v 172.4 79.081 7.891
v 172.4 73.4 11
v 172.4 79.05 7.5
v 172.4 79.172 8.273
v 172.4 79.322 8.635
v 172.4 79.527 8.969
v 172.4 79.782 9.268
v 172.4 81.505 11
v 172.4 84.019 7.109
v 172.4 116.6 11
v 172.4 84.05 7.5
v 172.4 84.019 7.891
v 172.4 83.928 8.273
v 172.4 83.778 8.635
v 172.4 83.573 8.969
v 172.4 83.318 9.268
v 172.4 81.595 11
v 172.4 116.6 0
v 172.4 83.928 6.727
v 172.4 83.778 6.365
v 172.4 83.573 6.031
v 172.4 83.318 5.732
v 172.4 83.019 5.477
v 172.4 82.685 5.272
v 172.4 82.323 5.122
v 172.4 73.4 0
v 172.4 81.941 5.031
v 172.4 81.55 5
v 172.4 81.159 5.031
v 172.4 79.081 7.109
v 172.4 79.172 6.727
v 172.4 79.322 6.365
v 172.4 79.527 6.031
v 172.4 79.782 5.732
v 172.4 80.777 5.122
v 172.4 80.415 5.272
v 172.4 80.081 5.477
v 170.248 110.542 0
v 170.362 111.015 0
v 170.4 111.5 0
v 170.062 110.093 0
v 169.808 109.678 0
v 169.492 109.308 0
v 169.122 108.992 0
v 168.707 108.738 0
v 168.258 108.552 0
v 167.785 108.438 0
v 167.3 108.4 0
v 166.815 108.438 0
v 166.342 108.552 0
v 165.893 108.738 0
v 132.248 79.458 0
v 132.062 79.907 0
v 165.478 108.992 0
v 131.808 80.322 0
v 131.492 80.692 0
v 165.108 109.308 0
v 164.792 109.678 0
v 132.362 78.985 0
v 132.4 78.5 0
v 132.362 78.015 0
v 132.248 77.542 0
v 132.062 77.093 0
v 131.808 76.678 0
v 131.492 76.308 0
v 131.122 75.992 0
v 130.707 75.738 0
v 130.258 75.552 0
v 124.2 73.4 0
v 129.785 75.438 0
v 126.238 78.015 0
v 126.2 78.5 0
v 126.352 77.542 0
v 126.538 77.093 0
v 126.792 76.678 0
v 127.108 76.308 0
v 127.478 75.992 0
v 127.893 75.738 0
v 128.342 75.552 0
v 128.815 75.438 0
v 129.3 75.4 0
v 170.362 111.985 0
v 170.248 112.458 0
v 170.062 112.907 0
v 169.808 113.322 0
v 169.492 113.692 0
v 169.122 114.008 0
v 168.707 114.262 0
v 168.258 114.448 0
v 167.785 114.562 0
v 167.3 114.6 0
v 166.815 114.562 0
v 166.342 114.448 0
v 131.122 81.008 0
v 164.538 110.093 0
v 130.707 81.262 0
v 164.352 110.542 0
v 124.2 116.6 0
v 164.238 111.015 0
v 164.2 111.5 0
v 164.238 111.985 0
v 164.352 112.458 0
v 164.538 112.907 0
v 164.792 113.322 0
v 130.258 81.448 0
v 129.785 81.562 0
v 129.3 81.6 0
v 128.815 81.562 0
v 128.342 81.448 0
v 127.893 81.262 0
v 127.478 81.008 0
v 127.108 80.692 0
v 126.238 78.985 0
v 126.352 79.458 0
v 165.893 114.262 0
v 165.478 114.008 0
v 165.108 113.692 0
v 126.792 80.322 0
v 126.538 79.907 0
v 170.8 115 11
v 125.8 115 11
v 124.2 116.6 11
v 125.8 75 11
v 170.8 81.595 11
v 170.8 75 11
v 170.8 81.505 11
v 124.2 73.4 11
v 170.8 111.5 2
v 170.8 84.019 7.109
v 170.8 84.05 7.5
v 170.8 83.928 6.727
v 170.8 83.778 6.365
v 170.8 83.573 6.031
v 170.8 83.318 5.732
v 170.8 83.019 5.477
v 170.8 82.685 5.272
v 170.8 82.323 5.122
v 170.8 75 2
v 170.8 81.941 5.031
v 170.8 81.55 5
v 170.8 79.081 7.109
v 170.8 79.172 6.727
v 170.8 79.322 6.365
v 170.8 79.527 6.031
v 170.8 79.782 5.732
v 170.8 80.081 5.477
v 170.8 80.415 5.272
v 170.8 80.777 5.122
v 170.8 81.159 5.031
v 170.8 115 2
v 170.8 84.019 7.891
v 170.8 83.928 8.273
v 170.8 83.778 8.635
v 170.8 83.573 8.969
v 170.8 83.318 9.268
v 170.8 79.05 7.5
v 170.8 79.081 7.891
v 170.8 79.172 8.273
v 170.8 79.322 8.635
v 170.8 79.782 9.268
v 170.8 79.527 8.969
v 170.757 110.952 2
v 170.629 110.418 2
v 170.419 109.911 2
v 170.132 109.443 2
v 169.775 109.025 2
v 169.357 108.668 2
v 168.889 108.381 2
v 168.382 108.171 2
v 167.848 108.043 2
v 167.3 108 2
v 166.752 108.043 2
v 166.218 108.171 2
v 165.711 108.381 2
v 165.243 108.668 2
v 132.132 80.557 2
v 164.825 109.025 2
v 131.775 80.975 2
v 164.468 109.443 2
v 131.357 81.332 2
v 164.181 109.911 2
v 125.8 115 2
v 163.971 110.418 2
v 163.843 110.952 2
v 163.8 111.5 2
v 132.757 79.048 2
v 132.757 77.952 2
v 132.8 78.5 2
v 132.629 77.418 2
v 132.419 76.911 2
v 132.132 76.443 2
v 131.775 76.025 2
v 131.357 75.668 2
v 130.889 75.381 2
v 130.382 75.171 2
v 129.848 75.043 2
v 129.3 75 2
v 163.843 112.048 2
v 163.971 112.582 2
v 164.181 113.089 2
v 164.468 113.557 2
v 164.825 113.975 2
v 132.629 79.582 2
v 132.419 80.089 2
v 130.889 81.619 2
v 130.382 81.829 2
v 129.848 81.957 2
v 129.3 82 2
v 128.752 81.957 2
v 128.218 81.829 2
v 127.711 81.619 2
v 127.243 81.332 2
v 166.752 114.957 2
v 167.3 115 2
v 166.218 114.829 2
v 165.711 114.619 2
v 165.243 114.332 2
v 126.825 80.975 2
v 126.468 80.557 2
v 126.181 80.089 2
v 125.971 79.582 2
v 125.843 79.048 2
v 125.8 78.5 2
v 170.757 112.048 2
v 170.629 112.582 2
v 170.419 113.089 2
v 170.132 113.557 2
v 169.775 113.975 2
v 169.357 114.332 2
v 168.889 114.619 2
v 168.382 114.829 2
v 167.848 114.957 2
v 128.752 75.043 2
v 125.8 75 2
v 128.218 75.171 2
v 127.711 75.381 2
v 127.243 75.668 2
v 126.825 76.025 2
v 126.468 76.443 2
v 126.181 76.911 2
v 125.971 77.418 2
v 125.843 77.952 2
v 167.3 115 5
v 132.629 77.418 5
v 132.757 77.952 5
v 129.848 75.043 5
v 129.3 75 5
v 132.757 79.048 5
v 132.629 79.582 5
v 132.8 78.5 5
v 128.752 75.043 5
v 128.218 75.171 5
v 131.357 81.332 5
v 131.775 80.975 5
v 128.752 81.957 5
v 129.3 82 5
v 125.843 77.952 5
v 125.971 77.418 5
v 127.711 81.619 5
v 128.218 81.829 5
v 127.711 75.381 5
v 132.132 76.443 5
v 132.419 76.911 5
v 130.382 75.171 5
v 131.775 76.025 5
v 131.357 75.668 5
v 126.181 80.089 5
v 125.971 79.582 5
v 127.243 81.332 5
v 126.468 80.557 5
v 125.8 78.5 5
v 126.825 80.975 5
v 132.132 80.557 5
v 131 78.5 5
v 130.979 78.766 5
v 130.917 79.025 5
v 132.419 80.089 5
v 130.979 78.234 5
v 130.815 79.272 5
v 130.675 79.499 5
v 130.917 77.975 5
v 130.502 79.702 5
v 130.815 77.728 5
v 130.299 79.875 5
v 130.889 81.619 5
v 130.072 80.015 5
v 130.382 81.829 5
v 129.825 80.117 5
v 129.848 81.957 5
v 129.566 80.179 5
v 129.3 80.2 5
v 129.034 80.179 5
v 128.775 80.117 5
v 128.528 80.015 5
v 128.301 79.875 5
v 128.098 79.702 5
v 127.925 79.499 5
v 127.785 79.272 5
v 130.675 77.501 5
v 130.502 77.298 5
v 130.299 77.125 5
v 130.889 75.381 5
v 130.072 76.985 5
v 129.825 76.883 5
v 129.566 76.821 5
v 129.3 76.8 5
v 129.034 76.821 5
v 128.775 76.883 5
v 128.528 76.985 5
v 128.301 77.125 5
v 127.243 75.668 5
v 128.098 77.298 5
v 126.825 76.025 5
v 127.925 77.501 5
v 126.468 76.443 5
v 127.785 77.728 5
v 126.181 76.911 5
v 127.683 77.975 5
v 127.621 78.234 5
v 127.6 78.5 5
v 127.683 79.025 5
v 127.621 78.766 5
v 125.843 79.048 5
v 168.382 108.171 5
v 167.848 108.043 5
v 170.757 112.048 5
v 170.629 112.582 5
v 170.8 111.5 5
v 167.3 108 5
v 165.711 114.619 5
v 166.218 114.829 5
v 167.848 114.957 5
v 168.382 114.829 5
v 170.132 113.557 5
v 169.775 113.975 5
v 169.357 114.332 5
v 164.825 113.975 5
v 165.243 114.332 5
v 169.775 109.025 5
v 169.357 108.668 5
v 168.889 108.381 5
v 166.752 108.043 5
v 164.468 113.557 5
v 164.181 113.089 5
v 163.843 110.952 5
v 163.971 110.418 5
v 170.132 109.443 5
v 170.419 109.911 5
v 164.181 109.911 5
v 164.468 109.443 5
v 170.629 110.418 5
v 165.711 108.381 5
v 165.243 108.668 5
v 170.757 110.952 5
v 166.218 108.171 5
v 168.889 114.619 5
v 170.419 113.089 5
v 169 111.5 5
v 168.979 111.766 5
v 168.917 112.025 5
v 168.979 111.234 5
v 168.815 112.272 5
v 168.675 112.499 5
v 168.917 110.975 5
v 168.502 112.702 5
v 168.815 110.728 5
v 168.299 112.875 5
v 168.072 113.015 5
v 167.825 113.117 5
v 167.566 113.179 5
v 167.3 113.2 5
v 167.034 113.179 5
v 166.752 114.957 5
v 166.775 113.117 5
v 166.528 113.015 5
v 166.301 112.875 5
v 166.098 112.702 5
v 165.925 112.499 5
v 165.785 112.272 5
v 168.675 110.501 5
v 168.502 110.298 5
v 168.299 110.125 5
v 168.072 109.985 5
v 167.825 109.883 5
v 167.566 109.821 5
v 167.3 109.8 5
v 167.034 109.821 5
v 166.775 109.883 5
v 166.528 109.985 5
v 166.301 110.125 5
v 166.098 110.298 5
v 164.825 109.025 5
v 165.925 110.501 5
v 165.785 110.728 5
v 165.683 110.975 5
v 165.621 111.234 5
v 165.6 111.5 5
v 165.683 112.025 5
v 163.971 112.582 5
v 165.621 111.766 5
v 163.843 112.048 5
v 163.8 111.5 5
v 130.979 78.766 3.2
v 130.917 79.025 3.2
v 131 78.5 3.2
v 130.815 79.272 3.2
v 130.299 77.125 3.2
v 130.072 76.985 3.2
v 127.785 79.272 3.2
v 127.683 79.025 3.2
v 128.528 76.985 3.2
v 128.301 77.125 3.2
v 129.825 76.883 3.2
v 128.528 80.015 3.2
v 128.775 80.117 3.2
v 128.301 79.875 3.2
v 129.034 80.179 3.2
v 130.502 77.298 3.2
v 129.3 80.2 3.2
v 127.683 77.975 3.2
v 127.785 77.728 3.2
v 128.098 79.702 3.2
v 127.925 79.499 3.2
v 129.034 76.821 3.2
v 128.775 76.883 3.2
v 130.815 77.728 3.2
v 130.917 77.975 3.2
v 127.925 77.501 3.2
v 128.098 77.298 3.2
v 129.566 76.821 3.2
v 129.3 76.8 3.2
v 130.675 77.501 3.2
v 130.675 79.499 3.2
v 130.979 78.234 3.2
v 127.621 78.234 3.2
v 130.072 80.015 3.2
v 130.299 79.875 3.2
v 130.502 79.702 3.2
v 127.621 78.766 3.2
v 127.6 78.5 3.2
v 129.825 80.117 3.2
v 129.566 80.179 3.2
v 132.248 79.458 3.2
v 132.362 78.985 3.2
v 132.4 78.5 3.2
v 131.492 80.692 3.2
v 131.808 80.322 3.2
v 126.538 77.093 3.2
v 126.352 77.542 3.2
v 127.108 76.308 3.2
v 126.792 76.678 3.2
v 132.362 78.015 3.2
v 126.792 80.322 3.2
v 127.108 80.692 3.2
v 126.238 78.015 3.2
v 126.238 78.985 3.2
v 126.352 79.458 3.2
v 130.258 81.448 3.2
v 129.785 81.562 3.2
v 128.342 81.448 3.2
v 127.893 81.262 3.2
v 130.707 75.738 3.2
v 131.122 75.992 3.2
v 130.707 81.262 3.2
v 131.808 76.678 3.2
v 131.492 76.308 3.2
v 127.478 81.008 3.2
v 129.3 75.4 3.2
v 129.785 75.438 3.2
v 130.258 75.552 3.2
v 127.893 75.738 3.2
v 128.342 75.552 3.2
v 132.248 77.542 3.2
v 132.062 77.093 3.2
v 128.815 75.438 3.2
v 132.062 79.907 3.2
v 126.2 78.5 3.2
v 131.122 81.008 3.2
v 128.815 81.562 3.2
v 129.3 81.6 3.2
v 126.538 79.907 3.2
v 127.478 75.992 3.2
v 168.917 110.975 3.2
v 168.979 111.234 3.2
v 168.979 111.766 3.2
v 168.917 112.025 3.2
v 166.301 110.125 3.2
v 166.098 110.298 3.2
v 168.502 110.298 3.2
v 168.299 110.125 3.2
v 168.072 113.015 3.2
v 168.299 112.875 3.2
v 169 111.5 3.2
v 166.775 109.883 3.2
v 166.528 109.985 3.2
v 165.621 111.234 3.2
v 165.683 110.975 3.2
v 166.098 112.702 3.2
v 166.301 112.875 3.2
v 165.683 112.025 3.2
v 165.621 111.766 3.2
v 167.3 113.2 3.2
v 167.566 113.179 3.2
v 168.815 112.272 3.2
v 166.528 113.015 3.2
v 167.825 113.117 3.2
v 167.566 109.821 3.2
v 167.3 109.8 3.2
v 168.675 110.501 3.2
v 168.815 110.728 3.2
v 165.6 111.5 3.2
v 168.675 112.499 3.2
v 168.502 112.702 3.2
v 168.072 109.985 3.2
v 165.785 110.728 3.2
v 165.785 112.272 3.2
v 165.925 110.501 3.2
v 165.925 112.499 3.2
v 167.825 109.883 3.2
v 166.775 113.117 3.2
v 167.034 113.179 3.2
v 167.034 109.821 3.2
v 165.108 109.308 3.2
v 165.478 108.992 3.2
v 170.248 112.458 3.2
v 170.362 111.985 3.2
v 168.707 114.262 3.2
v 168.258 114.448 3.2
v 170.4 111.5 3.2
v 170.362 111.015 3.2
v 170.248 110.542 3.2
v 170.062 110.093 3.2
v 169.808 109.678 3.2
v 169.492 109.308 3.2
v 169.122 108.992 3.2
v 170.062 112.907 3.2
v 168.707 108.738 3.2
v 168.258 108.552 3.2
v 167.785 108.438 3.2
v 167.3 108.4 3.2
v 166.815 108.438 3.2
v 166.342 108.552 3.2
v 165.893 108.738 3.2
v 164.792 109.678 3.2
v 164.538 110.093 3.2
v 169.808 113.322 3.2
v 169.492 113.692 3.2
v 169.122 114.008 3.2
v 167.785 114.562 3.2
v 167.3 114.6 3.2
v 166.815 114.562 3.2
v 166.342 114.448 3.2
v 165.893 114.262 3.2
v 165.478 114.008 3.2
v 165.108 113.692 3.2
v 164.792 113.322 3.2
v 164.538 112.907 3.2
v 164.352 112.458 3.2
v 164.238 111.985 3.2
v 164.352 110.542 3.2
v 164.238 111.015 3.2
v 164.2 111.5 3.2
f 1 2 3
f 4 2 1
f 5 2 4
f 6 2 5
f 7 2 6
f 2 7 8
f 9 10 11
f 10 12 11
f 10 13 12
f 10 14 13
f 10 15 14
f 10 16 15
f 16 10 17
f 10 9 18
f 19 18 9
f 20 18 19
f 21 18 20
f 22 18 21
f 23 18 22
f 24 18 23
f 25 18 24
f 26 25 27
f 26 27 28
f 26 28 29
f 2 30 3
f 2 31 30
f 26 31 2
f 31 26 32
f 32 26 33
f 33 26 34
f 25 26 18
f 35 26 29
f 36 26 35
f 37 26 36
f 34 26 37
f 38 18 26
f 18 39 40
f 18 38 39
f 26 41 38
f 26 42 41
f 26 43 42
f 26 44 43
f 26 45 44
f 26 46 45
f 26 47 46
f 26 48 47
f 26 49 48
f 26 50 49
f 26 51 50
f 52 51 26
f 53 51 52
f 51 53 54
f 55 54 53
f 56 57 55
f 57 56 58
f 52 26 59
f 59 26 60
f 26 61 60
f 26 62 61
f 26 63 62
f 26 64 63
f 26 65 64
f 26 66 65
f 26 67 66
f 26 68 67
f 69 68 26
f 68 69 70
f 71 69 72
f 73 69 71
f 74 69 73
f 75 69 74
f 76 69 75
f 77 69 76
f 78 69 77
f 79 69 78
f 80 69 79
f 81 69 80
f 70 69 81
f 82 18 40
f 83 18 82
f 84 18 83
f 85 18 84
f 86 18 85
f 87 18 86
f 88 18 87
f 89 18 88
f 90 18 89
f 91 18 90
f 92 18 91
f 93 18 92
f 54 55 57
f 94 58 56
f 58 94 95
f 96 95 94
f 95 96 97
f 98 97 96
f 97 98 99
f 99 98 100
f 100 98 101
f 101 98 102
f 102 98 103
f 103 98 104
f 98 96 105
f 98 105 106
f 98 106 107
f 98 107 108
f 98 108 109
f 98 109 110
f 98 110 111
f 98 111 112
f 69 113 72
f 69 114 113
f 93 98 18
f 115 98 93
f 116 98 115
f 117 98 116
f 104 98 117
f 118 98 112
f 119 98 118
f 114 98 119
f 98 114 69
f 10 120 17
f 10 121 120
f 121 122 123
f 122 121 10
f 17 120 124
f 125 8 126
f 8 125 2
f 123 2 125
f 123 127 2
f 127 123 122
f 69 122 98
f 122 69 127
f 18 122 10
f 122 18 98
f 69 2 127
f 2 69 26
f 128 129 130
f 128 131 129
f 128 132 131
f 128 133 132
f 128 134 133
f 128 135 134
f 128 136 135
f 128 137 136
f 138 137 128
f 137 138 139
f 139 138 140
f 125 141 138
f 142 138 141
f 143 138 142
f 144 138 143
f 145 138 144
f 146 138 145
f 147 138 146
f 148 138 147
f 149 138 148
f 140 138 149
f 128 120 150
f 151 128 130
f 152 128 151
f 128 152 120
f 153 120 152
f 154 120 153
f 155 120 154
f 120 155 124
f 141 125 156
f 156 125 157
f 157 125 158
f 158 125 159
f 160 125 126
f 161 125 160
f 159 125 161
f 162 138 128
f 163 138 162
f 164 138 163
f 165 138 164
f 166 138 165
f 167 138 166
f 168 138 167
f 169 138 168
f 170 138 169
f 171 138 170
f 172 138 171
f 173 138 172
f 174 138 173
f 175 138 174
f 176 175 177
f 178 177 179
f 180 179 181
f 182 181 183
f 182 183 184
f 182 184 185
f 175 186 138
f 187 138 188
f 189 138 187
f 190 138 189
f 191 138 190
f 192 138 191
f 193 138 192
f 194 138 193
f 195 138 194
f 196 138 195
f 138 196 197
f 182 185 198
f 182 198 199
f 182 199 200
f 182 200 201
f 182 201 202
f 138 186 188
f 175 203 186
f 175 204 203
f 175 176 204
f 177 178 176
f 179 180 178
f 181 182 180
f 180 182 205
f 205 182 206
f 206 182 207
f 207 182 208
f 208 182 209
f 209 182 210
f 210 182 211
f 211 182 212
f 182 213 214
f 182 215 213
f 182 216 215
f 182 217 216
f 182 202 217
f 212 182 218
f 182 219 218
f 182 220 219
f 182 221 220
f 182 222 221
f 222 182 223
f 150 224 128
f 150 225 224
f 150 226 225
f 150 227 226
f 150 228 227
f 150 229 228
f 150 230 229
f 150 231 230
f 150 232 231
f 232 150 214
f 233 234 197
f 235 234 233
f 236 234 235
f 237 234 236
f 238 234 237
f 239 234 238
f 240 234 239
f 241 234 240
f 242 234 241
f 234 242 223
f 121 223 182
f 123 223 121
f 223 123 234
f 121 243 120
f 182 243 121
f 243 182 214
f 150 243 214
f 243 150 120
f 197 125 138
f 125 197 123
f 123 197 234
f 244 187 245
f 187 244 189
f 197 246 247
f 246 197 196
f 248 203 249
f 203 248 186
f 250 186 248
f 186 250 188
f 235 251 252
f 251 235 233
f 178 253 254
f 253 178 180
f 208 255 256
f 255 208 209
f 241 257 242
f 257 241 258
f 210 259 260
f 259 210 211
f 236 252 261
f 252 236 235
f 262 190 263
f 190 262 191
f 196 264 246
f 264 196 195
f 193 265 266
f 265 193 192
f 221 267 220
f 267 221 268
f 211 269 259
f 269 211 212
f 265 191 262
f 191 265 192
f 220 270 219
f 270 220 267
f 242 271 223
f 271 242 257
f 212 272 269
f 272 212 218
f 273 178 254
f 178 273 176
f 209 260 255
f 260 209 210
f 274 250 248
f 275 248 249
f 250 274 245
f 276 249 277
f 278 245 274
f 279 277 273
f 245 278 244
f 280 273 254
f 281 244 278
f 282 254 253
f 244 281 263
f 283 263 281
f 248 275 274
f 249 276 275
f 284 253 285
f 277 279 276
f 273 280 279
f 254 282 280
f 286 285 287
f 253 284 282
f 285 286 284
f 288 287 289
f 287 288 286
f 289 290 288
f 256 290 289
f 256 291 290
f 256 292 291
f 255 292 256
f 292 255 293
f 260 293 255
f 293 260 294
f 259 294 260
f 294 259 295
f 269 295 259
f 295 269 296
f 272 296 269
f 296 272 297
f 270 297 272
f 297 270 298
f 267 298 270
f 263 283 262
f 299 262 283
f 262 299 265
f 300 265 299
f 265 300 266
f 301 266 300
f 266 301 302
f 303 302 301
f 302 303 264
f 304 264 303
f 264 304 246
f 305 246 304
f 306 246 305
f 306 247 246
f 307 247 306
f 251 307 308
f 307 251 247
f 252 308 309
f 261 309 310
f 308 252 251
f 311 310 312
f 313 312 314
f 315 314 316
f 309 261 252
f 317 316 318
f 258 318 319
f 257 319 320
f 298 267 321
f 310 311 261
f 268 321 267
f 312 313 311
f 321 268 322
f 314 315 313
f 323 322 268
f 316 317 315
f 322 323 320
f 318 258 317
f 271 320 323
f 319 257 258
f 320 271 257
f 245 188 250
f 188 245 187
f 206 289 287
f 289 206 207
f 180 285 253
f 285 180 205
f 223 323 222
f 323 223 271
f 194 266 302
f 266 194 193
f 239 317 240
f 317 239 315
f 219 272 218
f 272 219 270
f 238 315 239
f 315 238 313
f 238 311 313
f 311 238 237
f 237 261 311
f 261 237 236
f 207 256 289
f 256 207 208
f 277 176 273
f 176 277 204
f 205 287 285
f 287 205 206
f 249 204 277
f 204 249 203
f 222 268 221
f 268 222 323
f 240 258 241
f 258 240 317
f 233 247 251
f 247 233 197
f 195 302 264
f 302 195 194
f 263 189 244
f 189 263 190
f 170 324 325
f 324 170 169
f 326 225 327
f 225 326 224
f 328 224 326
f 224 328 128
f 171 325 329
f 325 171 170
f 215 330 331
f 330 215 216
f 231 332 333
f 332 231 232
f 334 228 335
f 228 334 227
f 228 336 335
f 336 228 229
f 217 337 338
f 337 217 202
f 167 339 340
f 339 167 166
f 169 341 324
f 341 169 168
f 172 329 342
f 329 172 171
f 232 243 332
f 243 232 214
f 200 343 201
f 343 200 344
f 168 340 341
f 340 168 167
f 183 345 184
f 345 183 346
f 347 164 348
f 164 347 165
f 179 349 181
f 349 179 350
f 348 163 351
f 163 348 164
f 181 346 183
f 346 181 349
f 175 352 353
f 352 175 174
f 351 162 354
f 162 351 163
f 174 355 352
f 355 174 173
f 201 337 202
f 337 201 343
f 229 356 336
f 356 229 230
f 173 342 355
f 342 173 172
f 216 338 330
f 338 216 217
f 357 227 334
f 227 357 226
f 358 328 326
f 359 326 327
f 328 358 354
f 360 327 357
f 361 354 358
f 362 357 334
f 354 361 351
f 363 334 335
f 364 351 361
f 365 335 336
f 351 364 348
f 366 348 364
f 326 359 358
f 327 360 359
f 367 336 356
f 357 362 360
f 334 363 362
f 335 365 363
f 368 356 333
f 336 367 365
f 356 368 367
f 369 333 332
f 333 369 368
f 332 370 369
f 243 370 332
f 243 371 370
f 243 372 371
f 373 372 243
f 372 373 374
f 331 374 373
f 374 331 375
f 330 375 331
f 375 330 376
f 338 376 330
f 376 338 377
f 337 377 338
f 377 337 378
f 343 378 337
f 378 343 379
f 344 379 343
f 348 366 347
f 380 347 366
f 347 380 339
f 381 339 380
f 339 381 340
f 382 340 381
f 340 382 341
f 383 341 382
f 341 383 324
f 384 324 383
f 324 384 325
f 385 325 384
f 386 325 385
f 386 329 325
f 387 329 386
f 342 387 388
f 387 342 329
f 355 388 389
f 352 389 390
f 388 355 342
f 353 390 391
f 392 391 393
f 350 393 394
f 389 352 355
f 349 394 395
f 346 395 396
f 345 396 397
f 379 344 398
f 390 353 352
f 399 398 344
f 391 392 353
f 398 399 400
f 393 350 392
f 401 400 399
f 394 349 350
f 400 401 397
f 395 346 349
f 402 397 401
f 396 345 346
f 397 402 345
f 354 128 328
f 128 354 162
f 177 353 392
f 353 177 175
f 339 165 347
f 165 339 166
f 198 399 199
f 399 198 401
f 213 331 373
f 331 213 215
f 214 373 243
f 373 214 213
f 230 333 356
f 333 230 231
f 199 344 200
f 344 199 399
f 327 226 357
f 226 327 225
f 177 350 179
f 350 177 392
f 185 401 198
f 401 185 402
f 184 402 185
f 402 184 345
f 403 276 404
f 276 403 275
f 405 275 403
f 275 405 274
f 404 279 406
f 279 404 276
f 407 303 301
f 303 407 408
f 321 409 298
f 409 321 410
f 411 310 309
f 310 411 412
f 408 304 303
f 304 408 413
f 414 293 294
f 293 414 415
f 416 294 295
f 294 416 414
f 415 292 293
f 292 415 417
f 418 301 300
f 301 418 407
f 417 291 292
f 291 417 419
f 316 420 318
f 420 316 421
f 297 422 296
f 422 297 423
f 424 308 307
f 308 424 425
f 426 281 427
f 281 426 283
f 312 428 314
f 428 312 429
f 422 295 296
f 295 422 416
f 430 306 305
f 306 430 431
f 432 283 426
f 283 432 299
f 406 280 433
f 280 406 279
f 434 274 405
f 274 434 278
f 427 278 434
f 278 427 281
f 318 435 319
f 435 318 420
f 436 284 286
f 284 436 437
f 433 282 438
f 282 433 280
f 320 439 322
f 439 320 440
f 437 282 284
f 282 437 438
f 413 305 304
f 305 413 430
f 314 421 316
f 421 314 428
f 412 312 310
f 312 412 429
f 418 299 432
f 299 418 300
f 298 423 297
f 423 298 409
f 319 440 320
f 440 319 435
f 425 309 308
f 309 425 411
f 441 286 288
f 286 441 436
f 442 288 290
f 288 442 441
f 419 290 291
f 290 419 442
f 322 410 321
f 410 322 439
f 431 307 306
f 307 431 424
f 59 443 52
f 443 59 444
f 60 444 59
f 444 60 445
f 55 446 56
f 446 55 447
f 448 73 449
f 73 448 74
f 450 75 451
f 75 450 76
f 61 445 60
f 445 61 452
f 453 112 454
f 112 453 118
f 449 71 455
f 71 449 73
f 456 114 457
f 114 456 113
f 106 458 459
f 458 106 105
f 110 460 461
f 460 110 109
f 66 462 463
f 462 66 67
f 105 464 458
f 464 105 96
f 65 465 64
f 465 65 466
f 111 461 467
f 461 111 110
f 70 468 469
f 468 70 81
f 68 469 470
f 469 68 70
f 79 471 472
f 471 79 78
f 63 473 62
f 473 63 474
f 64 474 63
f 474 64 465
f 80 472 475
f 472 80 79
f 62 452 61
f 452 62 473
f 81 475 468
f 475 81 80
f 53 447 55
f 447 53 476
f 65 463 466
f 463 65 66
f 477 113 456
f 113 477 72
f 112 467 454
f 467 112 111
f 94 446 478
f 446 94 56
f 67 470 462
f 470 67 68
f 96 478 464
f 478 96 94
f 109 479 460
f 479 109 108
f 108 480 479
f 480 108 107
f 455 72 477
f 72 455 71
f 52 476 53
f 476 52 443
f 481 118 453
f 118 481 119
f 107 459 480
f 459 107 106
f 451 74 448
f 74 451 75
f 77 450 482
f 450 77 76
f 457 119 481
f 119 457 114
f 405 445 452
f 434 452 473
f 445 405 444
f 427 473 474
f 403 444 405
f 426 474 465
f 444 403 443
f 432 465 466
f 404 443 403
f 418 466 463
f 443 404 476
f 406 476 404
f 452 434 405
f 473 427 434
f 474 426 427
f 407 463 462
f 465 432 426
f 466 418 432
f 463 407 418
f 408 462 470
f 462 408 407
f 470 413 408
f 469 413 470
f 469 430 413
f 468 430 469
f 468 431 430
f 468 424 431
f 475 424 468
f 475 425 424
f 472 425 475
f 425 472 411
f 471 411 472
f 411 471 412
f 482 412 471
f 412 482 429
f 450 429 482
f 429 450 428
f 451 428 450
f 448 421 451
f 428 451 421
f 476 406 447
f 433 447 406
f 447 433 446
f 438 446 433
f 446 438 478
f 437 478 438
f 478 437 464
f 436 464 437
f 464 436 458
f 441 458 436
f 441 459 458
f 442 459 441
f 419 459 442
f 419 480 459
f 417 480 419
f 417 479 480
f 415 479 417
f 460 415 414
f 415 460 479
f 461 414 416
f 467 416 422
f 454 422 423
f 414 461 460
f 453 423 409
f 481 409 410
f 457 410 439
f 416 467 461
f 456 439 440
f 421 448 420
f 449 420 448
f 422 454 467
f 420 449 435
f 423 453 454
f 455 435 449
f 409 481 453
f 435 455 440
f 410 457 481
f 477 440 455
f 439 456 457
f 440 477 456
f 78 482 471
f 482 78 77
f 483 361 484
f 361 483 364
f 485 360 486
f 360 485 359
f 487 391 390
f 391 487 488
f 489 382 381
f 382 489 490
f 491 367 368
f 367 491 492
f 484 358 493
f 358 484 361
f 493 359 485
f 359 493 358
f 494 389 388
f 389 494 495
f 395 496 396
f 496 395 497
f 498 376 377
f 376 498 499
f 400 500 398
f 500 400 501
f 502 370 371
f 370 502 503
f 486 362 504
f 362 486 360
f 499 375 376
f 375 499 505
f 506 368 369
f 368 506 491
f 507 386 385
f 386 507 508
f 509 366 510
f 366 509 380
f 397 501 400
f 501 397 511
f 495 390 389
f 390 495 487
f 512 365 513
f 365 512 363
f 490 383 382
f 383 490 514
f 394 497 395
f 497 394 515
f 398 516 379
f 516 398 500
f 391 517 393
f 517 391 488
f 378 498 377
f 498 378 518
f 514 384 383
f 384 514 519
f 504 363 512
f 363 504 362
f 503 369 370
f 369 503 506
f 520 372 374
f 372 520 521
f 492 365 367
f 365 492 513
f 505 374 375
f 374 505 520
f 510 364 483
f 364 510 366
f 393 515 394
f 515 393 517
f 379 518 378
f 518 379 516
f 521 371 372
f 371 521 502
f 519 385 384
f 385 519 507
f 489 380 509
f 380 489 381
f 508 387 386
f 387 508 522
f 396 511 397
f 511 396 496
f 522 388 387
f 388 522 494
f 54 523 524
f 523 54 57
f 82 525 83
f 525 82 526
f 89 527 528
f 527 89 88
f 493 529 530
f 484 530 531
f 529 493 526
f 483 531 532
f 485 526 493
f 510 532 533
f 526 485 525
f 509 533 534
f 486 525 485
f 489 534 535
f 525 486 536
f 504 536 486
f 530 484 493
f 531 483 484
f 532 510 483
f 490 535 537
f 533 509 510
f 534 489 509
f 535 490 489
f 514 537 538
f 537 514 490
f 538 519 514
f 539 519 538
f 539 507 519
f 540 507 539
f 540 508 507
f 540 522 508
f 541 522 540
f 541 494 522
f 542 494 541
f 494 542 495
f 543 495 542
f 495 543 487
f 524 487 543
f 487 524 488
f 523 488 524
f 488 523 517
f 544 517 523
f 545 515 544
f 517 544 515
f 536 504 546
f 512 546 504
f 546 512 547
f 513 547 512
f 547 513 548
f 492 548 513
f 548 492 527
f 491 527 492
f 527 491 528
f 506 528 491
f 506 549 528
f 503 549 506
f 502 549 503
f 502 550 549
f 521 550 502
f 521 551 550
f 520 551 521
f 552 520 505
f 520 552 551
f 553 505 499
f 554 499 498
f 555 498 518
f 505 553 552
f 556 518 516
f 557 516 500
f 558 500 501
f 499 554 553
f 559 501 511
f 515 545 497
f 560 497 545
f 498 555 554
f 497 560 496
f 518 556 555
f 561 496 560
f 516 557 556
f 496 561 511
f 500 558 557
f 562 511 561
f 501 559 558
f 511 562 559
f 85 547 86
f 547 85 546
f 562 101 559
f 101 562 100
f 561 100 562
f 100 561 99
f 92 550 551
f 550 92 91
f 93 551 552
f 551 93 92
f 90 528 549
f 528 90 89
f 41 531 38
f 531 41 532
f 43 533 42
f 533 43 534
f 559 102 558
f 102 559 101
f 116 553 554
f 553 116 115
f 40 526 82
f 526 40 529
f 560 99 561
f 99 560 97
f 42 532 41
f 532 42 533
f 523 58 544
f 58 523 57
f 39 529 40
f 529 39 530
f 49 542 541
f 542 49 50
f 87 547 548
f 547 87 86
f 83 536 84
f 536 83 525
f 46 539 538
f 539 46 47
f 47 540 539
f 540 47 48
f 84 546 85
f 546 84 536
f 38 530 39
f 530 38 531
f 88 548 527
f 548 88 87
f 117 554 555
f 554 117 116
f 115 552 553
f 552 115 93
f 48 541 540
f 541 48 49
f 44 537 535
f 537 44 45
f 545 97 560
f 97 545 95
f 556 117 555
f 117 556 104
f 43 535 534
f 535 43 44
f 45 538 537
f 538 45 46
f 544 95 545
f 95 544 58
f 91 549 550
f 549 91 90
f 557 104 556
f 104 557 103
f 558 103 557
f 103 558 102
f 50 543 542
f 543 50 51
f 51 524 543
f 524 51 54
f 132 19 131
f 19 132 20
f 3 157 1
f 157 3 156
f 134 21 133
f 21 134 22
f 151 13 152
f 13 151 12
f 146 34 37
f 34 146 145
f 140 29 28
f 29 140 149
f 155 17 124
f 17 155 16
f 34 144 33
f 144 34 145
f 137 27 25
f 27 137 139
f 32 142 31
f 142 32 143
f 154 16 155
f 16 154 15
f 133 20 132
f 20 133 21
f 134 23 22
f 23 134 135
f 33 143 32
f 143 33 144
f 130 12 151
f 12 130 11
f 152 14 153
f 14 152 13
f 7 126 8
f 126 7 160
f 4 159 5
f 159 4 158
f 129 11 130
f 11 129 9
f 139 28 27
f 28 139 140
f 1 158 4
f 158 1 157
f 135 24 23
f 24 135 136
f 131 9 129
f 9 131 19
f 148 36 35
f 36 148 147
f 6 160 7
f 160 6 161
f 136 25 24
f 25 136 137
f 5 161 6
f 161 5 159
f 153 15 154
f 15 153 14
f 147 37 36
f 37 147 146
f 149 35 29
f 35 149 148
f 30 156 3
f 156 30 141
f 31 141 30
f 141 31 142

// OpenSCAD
include <../lib/kobo-meshcore-case-lib.scad>;
$fn = 40;
pod_cover_print();
